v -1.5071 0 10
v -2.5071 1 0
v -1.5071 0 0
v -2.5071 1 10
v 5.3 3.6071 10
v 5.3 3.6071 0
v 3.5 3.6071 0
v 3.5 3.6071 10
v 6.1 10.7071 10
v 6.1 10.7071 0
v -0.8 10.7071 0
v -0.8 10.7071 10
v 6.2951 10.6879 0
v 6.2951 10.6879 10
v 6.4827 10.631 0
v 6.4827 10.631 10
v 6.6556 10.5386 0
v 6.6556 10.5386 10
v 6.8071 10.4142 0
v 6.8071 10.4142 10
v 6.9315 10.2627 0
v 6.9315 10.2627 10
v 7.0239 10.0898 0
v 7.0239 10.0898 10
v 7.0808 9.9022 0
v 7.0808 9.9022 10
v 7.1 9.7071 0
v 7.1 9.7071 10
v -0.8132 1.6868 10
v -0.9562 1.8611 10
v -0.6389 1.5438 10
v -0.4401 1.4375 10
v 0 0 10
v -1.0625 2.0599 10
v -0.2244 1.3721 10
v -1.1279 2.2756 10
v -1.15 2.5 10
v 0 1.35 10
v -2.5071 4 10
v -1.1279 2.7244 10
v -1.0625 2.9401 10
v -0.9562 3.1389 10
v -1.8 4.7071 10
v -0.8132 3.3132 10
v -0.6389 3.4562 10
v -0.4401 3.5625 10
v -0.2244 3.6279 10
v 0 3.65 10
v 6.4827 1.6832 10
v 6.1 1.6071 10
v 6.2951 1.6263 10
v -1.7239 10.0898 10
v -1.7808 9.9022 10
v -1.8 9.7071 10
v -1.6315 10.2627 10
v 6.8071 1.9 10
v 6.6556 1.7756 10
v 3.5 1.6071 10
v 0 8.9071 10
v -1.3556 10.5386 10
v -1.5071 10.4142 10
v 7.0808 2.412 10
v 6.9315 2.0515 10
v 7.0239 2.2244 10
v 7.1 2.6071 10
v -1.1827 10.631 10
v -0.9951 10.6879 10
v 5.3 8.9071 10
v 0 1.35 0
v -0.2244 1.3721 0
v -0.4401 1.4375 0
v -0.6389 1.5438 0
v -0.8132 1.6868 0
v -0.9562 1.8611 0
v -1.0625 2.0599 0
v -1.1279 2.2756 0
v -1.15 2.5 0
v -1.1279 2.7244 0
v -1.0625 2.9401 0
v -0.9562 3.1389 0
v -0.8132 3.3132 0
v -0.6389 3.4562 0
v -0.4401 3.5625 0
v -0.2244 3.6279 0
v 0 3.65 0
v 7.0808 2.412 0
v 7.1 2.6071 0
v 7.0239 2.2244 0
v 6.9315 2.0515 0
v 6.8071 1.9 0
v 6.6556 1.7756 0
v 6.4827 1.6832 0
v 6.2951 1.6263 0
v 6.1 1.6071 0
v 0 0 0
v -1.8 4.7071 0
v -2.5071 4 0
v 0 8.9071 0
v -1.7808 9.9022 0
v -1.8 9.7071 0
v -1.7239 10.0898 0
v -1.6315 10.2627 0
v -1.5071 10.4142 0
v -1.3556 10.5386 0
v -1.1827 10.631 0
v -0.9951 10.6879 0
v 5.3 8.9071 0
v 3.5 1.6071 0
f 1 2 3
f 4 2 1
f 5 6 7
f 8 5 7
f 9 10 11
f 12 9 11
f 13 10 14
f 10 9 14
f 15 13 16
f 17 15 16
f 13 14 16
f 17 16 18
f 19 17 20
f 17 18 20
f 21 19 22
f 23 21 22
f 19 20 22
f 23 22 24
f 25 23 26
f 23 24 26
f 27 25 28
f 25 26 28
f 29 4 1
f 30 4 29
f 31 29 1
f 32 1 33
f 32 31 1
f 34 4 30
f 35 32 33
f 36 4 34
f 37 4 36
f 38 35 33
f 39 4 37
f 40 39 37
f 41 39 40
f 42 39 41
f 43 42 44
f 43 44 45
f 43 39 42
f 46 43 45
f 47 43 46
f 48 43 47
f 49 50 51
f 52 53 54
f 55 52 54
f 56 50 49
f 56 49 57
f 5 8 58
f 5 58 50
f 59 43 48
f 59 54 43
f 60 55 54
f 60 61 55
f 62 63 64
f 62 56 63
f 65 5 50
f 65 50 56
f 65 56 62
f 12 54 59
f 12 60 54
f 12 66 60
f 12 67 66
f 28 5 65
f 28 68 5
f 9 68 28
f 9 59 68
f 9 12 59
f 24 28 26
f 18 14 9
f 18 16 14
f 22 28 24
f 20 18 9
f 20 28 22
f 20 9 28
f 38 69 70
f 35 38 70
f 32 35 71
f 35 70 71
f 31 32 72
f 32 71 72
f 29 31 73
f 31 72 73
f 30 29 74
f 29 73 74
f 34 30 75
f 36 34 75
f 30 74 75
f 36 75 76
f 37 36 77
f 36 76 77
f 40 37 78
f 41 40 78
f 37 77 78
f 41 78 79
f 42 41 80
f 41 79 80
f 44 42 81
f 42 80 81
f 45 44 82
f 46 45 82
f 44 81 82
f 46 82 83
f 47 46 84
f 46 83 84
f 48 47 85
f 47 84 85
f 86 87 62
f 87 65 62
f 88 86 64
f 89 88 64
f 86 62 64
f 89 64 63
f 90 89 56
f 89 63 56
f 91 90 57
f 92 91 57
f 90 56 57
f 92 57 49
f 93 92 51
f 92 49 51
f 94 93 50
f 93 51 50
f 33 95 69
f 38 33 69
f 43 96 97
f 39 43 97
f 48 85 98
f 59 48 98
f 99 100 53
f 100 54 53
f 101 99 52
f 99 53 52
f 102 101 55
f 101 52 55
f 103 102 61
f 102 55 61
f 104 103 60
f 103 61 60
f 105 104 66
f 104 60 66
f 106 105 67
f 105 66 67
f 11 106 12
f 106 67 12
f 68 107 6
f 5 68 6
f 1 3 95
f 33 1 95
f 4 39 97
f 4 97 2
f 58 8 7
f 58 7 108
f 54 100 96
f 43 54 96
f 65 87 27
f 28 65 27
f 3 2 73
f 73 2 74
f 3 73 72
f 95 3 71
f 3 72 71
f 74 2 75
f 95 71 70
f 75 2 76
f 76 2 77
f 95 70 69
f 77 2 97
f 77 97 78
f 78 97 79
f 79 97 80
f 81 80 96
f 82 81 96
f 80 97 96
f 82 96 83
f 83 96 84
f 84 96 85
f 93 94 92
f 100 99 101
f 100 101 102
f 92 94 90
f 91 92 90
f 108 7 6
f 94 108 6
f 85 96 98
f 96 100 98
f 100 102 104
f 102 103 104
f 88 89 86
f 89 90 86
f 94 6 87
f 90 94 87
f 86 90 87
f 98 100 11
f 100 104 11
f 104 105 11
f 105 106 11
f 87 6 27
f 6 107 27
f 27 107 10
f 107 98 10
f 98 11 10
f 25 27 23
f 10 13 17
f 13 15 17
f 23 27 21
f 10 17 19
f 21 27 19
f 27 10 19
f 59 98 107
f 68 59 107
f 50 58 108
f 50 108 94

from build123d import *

# Parameters (mm, degrees)
F1_DEPTH = 10
F2_SIZE  = 1
F3_R     = 1


with BuildPart() as f1:
    # F0 (on Top) → F1 (new body)
    with BuildSketch(Plane.XY):
        with BuildLine():
            Line((-2.507107, 0), (0, 0))
            Line((0, 0), (0, 1.35))
            ThreePointArc((0, 1.35), (-1.15, 2.5), (0, 3.65))
            Line((0, 3.65), (0, 8.907107))
            Line((0, 8.907107), (5.3, 8.907107))
            Line((5.3, 8.907107), (5.3, 3.607107))
            Line((5.3, 3.607107), (3.5, 3.607107))
            Line((3.5, 3.607107), (3.5, 1.607107))
            Line((3.5, 1.607107), (7.1, 1.607107))
            Line((7.1, 1.607107), (7.1, 10.707107))
            Line((7.1, 10.707107), (-1.8, 10.707107))
            Line((-1.8, 10.707107), (-1.8, 4.707107))
            Line((-1.8, 4.707107), (-2.507107, 4))
            Line((-2.507107, 4), (-2.507107, 0))
        make_face()
    extrude(amount=F1_DEPTH)

    # F2
    f2_edges = [f1.edges().sort_by_distance(p)[0] for p in [
        (-2.507107, 0, 5),
    ]]
    chamfer(f2_edges, length=F2_SIZE)

    # F3
    f3_edges = [f1.edges().sort_by_distance(p)[0] for p in [
        (7.1, 1.607107, 5),
        (7.1, 10.707107, 5),
        (-1.8, 10.707107, 5),
    ]]
    fillet(f3_edges, radius=F3_R)


solid = f1.part
